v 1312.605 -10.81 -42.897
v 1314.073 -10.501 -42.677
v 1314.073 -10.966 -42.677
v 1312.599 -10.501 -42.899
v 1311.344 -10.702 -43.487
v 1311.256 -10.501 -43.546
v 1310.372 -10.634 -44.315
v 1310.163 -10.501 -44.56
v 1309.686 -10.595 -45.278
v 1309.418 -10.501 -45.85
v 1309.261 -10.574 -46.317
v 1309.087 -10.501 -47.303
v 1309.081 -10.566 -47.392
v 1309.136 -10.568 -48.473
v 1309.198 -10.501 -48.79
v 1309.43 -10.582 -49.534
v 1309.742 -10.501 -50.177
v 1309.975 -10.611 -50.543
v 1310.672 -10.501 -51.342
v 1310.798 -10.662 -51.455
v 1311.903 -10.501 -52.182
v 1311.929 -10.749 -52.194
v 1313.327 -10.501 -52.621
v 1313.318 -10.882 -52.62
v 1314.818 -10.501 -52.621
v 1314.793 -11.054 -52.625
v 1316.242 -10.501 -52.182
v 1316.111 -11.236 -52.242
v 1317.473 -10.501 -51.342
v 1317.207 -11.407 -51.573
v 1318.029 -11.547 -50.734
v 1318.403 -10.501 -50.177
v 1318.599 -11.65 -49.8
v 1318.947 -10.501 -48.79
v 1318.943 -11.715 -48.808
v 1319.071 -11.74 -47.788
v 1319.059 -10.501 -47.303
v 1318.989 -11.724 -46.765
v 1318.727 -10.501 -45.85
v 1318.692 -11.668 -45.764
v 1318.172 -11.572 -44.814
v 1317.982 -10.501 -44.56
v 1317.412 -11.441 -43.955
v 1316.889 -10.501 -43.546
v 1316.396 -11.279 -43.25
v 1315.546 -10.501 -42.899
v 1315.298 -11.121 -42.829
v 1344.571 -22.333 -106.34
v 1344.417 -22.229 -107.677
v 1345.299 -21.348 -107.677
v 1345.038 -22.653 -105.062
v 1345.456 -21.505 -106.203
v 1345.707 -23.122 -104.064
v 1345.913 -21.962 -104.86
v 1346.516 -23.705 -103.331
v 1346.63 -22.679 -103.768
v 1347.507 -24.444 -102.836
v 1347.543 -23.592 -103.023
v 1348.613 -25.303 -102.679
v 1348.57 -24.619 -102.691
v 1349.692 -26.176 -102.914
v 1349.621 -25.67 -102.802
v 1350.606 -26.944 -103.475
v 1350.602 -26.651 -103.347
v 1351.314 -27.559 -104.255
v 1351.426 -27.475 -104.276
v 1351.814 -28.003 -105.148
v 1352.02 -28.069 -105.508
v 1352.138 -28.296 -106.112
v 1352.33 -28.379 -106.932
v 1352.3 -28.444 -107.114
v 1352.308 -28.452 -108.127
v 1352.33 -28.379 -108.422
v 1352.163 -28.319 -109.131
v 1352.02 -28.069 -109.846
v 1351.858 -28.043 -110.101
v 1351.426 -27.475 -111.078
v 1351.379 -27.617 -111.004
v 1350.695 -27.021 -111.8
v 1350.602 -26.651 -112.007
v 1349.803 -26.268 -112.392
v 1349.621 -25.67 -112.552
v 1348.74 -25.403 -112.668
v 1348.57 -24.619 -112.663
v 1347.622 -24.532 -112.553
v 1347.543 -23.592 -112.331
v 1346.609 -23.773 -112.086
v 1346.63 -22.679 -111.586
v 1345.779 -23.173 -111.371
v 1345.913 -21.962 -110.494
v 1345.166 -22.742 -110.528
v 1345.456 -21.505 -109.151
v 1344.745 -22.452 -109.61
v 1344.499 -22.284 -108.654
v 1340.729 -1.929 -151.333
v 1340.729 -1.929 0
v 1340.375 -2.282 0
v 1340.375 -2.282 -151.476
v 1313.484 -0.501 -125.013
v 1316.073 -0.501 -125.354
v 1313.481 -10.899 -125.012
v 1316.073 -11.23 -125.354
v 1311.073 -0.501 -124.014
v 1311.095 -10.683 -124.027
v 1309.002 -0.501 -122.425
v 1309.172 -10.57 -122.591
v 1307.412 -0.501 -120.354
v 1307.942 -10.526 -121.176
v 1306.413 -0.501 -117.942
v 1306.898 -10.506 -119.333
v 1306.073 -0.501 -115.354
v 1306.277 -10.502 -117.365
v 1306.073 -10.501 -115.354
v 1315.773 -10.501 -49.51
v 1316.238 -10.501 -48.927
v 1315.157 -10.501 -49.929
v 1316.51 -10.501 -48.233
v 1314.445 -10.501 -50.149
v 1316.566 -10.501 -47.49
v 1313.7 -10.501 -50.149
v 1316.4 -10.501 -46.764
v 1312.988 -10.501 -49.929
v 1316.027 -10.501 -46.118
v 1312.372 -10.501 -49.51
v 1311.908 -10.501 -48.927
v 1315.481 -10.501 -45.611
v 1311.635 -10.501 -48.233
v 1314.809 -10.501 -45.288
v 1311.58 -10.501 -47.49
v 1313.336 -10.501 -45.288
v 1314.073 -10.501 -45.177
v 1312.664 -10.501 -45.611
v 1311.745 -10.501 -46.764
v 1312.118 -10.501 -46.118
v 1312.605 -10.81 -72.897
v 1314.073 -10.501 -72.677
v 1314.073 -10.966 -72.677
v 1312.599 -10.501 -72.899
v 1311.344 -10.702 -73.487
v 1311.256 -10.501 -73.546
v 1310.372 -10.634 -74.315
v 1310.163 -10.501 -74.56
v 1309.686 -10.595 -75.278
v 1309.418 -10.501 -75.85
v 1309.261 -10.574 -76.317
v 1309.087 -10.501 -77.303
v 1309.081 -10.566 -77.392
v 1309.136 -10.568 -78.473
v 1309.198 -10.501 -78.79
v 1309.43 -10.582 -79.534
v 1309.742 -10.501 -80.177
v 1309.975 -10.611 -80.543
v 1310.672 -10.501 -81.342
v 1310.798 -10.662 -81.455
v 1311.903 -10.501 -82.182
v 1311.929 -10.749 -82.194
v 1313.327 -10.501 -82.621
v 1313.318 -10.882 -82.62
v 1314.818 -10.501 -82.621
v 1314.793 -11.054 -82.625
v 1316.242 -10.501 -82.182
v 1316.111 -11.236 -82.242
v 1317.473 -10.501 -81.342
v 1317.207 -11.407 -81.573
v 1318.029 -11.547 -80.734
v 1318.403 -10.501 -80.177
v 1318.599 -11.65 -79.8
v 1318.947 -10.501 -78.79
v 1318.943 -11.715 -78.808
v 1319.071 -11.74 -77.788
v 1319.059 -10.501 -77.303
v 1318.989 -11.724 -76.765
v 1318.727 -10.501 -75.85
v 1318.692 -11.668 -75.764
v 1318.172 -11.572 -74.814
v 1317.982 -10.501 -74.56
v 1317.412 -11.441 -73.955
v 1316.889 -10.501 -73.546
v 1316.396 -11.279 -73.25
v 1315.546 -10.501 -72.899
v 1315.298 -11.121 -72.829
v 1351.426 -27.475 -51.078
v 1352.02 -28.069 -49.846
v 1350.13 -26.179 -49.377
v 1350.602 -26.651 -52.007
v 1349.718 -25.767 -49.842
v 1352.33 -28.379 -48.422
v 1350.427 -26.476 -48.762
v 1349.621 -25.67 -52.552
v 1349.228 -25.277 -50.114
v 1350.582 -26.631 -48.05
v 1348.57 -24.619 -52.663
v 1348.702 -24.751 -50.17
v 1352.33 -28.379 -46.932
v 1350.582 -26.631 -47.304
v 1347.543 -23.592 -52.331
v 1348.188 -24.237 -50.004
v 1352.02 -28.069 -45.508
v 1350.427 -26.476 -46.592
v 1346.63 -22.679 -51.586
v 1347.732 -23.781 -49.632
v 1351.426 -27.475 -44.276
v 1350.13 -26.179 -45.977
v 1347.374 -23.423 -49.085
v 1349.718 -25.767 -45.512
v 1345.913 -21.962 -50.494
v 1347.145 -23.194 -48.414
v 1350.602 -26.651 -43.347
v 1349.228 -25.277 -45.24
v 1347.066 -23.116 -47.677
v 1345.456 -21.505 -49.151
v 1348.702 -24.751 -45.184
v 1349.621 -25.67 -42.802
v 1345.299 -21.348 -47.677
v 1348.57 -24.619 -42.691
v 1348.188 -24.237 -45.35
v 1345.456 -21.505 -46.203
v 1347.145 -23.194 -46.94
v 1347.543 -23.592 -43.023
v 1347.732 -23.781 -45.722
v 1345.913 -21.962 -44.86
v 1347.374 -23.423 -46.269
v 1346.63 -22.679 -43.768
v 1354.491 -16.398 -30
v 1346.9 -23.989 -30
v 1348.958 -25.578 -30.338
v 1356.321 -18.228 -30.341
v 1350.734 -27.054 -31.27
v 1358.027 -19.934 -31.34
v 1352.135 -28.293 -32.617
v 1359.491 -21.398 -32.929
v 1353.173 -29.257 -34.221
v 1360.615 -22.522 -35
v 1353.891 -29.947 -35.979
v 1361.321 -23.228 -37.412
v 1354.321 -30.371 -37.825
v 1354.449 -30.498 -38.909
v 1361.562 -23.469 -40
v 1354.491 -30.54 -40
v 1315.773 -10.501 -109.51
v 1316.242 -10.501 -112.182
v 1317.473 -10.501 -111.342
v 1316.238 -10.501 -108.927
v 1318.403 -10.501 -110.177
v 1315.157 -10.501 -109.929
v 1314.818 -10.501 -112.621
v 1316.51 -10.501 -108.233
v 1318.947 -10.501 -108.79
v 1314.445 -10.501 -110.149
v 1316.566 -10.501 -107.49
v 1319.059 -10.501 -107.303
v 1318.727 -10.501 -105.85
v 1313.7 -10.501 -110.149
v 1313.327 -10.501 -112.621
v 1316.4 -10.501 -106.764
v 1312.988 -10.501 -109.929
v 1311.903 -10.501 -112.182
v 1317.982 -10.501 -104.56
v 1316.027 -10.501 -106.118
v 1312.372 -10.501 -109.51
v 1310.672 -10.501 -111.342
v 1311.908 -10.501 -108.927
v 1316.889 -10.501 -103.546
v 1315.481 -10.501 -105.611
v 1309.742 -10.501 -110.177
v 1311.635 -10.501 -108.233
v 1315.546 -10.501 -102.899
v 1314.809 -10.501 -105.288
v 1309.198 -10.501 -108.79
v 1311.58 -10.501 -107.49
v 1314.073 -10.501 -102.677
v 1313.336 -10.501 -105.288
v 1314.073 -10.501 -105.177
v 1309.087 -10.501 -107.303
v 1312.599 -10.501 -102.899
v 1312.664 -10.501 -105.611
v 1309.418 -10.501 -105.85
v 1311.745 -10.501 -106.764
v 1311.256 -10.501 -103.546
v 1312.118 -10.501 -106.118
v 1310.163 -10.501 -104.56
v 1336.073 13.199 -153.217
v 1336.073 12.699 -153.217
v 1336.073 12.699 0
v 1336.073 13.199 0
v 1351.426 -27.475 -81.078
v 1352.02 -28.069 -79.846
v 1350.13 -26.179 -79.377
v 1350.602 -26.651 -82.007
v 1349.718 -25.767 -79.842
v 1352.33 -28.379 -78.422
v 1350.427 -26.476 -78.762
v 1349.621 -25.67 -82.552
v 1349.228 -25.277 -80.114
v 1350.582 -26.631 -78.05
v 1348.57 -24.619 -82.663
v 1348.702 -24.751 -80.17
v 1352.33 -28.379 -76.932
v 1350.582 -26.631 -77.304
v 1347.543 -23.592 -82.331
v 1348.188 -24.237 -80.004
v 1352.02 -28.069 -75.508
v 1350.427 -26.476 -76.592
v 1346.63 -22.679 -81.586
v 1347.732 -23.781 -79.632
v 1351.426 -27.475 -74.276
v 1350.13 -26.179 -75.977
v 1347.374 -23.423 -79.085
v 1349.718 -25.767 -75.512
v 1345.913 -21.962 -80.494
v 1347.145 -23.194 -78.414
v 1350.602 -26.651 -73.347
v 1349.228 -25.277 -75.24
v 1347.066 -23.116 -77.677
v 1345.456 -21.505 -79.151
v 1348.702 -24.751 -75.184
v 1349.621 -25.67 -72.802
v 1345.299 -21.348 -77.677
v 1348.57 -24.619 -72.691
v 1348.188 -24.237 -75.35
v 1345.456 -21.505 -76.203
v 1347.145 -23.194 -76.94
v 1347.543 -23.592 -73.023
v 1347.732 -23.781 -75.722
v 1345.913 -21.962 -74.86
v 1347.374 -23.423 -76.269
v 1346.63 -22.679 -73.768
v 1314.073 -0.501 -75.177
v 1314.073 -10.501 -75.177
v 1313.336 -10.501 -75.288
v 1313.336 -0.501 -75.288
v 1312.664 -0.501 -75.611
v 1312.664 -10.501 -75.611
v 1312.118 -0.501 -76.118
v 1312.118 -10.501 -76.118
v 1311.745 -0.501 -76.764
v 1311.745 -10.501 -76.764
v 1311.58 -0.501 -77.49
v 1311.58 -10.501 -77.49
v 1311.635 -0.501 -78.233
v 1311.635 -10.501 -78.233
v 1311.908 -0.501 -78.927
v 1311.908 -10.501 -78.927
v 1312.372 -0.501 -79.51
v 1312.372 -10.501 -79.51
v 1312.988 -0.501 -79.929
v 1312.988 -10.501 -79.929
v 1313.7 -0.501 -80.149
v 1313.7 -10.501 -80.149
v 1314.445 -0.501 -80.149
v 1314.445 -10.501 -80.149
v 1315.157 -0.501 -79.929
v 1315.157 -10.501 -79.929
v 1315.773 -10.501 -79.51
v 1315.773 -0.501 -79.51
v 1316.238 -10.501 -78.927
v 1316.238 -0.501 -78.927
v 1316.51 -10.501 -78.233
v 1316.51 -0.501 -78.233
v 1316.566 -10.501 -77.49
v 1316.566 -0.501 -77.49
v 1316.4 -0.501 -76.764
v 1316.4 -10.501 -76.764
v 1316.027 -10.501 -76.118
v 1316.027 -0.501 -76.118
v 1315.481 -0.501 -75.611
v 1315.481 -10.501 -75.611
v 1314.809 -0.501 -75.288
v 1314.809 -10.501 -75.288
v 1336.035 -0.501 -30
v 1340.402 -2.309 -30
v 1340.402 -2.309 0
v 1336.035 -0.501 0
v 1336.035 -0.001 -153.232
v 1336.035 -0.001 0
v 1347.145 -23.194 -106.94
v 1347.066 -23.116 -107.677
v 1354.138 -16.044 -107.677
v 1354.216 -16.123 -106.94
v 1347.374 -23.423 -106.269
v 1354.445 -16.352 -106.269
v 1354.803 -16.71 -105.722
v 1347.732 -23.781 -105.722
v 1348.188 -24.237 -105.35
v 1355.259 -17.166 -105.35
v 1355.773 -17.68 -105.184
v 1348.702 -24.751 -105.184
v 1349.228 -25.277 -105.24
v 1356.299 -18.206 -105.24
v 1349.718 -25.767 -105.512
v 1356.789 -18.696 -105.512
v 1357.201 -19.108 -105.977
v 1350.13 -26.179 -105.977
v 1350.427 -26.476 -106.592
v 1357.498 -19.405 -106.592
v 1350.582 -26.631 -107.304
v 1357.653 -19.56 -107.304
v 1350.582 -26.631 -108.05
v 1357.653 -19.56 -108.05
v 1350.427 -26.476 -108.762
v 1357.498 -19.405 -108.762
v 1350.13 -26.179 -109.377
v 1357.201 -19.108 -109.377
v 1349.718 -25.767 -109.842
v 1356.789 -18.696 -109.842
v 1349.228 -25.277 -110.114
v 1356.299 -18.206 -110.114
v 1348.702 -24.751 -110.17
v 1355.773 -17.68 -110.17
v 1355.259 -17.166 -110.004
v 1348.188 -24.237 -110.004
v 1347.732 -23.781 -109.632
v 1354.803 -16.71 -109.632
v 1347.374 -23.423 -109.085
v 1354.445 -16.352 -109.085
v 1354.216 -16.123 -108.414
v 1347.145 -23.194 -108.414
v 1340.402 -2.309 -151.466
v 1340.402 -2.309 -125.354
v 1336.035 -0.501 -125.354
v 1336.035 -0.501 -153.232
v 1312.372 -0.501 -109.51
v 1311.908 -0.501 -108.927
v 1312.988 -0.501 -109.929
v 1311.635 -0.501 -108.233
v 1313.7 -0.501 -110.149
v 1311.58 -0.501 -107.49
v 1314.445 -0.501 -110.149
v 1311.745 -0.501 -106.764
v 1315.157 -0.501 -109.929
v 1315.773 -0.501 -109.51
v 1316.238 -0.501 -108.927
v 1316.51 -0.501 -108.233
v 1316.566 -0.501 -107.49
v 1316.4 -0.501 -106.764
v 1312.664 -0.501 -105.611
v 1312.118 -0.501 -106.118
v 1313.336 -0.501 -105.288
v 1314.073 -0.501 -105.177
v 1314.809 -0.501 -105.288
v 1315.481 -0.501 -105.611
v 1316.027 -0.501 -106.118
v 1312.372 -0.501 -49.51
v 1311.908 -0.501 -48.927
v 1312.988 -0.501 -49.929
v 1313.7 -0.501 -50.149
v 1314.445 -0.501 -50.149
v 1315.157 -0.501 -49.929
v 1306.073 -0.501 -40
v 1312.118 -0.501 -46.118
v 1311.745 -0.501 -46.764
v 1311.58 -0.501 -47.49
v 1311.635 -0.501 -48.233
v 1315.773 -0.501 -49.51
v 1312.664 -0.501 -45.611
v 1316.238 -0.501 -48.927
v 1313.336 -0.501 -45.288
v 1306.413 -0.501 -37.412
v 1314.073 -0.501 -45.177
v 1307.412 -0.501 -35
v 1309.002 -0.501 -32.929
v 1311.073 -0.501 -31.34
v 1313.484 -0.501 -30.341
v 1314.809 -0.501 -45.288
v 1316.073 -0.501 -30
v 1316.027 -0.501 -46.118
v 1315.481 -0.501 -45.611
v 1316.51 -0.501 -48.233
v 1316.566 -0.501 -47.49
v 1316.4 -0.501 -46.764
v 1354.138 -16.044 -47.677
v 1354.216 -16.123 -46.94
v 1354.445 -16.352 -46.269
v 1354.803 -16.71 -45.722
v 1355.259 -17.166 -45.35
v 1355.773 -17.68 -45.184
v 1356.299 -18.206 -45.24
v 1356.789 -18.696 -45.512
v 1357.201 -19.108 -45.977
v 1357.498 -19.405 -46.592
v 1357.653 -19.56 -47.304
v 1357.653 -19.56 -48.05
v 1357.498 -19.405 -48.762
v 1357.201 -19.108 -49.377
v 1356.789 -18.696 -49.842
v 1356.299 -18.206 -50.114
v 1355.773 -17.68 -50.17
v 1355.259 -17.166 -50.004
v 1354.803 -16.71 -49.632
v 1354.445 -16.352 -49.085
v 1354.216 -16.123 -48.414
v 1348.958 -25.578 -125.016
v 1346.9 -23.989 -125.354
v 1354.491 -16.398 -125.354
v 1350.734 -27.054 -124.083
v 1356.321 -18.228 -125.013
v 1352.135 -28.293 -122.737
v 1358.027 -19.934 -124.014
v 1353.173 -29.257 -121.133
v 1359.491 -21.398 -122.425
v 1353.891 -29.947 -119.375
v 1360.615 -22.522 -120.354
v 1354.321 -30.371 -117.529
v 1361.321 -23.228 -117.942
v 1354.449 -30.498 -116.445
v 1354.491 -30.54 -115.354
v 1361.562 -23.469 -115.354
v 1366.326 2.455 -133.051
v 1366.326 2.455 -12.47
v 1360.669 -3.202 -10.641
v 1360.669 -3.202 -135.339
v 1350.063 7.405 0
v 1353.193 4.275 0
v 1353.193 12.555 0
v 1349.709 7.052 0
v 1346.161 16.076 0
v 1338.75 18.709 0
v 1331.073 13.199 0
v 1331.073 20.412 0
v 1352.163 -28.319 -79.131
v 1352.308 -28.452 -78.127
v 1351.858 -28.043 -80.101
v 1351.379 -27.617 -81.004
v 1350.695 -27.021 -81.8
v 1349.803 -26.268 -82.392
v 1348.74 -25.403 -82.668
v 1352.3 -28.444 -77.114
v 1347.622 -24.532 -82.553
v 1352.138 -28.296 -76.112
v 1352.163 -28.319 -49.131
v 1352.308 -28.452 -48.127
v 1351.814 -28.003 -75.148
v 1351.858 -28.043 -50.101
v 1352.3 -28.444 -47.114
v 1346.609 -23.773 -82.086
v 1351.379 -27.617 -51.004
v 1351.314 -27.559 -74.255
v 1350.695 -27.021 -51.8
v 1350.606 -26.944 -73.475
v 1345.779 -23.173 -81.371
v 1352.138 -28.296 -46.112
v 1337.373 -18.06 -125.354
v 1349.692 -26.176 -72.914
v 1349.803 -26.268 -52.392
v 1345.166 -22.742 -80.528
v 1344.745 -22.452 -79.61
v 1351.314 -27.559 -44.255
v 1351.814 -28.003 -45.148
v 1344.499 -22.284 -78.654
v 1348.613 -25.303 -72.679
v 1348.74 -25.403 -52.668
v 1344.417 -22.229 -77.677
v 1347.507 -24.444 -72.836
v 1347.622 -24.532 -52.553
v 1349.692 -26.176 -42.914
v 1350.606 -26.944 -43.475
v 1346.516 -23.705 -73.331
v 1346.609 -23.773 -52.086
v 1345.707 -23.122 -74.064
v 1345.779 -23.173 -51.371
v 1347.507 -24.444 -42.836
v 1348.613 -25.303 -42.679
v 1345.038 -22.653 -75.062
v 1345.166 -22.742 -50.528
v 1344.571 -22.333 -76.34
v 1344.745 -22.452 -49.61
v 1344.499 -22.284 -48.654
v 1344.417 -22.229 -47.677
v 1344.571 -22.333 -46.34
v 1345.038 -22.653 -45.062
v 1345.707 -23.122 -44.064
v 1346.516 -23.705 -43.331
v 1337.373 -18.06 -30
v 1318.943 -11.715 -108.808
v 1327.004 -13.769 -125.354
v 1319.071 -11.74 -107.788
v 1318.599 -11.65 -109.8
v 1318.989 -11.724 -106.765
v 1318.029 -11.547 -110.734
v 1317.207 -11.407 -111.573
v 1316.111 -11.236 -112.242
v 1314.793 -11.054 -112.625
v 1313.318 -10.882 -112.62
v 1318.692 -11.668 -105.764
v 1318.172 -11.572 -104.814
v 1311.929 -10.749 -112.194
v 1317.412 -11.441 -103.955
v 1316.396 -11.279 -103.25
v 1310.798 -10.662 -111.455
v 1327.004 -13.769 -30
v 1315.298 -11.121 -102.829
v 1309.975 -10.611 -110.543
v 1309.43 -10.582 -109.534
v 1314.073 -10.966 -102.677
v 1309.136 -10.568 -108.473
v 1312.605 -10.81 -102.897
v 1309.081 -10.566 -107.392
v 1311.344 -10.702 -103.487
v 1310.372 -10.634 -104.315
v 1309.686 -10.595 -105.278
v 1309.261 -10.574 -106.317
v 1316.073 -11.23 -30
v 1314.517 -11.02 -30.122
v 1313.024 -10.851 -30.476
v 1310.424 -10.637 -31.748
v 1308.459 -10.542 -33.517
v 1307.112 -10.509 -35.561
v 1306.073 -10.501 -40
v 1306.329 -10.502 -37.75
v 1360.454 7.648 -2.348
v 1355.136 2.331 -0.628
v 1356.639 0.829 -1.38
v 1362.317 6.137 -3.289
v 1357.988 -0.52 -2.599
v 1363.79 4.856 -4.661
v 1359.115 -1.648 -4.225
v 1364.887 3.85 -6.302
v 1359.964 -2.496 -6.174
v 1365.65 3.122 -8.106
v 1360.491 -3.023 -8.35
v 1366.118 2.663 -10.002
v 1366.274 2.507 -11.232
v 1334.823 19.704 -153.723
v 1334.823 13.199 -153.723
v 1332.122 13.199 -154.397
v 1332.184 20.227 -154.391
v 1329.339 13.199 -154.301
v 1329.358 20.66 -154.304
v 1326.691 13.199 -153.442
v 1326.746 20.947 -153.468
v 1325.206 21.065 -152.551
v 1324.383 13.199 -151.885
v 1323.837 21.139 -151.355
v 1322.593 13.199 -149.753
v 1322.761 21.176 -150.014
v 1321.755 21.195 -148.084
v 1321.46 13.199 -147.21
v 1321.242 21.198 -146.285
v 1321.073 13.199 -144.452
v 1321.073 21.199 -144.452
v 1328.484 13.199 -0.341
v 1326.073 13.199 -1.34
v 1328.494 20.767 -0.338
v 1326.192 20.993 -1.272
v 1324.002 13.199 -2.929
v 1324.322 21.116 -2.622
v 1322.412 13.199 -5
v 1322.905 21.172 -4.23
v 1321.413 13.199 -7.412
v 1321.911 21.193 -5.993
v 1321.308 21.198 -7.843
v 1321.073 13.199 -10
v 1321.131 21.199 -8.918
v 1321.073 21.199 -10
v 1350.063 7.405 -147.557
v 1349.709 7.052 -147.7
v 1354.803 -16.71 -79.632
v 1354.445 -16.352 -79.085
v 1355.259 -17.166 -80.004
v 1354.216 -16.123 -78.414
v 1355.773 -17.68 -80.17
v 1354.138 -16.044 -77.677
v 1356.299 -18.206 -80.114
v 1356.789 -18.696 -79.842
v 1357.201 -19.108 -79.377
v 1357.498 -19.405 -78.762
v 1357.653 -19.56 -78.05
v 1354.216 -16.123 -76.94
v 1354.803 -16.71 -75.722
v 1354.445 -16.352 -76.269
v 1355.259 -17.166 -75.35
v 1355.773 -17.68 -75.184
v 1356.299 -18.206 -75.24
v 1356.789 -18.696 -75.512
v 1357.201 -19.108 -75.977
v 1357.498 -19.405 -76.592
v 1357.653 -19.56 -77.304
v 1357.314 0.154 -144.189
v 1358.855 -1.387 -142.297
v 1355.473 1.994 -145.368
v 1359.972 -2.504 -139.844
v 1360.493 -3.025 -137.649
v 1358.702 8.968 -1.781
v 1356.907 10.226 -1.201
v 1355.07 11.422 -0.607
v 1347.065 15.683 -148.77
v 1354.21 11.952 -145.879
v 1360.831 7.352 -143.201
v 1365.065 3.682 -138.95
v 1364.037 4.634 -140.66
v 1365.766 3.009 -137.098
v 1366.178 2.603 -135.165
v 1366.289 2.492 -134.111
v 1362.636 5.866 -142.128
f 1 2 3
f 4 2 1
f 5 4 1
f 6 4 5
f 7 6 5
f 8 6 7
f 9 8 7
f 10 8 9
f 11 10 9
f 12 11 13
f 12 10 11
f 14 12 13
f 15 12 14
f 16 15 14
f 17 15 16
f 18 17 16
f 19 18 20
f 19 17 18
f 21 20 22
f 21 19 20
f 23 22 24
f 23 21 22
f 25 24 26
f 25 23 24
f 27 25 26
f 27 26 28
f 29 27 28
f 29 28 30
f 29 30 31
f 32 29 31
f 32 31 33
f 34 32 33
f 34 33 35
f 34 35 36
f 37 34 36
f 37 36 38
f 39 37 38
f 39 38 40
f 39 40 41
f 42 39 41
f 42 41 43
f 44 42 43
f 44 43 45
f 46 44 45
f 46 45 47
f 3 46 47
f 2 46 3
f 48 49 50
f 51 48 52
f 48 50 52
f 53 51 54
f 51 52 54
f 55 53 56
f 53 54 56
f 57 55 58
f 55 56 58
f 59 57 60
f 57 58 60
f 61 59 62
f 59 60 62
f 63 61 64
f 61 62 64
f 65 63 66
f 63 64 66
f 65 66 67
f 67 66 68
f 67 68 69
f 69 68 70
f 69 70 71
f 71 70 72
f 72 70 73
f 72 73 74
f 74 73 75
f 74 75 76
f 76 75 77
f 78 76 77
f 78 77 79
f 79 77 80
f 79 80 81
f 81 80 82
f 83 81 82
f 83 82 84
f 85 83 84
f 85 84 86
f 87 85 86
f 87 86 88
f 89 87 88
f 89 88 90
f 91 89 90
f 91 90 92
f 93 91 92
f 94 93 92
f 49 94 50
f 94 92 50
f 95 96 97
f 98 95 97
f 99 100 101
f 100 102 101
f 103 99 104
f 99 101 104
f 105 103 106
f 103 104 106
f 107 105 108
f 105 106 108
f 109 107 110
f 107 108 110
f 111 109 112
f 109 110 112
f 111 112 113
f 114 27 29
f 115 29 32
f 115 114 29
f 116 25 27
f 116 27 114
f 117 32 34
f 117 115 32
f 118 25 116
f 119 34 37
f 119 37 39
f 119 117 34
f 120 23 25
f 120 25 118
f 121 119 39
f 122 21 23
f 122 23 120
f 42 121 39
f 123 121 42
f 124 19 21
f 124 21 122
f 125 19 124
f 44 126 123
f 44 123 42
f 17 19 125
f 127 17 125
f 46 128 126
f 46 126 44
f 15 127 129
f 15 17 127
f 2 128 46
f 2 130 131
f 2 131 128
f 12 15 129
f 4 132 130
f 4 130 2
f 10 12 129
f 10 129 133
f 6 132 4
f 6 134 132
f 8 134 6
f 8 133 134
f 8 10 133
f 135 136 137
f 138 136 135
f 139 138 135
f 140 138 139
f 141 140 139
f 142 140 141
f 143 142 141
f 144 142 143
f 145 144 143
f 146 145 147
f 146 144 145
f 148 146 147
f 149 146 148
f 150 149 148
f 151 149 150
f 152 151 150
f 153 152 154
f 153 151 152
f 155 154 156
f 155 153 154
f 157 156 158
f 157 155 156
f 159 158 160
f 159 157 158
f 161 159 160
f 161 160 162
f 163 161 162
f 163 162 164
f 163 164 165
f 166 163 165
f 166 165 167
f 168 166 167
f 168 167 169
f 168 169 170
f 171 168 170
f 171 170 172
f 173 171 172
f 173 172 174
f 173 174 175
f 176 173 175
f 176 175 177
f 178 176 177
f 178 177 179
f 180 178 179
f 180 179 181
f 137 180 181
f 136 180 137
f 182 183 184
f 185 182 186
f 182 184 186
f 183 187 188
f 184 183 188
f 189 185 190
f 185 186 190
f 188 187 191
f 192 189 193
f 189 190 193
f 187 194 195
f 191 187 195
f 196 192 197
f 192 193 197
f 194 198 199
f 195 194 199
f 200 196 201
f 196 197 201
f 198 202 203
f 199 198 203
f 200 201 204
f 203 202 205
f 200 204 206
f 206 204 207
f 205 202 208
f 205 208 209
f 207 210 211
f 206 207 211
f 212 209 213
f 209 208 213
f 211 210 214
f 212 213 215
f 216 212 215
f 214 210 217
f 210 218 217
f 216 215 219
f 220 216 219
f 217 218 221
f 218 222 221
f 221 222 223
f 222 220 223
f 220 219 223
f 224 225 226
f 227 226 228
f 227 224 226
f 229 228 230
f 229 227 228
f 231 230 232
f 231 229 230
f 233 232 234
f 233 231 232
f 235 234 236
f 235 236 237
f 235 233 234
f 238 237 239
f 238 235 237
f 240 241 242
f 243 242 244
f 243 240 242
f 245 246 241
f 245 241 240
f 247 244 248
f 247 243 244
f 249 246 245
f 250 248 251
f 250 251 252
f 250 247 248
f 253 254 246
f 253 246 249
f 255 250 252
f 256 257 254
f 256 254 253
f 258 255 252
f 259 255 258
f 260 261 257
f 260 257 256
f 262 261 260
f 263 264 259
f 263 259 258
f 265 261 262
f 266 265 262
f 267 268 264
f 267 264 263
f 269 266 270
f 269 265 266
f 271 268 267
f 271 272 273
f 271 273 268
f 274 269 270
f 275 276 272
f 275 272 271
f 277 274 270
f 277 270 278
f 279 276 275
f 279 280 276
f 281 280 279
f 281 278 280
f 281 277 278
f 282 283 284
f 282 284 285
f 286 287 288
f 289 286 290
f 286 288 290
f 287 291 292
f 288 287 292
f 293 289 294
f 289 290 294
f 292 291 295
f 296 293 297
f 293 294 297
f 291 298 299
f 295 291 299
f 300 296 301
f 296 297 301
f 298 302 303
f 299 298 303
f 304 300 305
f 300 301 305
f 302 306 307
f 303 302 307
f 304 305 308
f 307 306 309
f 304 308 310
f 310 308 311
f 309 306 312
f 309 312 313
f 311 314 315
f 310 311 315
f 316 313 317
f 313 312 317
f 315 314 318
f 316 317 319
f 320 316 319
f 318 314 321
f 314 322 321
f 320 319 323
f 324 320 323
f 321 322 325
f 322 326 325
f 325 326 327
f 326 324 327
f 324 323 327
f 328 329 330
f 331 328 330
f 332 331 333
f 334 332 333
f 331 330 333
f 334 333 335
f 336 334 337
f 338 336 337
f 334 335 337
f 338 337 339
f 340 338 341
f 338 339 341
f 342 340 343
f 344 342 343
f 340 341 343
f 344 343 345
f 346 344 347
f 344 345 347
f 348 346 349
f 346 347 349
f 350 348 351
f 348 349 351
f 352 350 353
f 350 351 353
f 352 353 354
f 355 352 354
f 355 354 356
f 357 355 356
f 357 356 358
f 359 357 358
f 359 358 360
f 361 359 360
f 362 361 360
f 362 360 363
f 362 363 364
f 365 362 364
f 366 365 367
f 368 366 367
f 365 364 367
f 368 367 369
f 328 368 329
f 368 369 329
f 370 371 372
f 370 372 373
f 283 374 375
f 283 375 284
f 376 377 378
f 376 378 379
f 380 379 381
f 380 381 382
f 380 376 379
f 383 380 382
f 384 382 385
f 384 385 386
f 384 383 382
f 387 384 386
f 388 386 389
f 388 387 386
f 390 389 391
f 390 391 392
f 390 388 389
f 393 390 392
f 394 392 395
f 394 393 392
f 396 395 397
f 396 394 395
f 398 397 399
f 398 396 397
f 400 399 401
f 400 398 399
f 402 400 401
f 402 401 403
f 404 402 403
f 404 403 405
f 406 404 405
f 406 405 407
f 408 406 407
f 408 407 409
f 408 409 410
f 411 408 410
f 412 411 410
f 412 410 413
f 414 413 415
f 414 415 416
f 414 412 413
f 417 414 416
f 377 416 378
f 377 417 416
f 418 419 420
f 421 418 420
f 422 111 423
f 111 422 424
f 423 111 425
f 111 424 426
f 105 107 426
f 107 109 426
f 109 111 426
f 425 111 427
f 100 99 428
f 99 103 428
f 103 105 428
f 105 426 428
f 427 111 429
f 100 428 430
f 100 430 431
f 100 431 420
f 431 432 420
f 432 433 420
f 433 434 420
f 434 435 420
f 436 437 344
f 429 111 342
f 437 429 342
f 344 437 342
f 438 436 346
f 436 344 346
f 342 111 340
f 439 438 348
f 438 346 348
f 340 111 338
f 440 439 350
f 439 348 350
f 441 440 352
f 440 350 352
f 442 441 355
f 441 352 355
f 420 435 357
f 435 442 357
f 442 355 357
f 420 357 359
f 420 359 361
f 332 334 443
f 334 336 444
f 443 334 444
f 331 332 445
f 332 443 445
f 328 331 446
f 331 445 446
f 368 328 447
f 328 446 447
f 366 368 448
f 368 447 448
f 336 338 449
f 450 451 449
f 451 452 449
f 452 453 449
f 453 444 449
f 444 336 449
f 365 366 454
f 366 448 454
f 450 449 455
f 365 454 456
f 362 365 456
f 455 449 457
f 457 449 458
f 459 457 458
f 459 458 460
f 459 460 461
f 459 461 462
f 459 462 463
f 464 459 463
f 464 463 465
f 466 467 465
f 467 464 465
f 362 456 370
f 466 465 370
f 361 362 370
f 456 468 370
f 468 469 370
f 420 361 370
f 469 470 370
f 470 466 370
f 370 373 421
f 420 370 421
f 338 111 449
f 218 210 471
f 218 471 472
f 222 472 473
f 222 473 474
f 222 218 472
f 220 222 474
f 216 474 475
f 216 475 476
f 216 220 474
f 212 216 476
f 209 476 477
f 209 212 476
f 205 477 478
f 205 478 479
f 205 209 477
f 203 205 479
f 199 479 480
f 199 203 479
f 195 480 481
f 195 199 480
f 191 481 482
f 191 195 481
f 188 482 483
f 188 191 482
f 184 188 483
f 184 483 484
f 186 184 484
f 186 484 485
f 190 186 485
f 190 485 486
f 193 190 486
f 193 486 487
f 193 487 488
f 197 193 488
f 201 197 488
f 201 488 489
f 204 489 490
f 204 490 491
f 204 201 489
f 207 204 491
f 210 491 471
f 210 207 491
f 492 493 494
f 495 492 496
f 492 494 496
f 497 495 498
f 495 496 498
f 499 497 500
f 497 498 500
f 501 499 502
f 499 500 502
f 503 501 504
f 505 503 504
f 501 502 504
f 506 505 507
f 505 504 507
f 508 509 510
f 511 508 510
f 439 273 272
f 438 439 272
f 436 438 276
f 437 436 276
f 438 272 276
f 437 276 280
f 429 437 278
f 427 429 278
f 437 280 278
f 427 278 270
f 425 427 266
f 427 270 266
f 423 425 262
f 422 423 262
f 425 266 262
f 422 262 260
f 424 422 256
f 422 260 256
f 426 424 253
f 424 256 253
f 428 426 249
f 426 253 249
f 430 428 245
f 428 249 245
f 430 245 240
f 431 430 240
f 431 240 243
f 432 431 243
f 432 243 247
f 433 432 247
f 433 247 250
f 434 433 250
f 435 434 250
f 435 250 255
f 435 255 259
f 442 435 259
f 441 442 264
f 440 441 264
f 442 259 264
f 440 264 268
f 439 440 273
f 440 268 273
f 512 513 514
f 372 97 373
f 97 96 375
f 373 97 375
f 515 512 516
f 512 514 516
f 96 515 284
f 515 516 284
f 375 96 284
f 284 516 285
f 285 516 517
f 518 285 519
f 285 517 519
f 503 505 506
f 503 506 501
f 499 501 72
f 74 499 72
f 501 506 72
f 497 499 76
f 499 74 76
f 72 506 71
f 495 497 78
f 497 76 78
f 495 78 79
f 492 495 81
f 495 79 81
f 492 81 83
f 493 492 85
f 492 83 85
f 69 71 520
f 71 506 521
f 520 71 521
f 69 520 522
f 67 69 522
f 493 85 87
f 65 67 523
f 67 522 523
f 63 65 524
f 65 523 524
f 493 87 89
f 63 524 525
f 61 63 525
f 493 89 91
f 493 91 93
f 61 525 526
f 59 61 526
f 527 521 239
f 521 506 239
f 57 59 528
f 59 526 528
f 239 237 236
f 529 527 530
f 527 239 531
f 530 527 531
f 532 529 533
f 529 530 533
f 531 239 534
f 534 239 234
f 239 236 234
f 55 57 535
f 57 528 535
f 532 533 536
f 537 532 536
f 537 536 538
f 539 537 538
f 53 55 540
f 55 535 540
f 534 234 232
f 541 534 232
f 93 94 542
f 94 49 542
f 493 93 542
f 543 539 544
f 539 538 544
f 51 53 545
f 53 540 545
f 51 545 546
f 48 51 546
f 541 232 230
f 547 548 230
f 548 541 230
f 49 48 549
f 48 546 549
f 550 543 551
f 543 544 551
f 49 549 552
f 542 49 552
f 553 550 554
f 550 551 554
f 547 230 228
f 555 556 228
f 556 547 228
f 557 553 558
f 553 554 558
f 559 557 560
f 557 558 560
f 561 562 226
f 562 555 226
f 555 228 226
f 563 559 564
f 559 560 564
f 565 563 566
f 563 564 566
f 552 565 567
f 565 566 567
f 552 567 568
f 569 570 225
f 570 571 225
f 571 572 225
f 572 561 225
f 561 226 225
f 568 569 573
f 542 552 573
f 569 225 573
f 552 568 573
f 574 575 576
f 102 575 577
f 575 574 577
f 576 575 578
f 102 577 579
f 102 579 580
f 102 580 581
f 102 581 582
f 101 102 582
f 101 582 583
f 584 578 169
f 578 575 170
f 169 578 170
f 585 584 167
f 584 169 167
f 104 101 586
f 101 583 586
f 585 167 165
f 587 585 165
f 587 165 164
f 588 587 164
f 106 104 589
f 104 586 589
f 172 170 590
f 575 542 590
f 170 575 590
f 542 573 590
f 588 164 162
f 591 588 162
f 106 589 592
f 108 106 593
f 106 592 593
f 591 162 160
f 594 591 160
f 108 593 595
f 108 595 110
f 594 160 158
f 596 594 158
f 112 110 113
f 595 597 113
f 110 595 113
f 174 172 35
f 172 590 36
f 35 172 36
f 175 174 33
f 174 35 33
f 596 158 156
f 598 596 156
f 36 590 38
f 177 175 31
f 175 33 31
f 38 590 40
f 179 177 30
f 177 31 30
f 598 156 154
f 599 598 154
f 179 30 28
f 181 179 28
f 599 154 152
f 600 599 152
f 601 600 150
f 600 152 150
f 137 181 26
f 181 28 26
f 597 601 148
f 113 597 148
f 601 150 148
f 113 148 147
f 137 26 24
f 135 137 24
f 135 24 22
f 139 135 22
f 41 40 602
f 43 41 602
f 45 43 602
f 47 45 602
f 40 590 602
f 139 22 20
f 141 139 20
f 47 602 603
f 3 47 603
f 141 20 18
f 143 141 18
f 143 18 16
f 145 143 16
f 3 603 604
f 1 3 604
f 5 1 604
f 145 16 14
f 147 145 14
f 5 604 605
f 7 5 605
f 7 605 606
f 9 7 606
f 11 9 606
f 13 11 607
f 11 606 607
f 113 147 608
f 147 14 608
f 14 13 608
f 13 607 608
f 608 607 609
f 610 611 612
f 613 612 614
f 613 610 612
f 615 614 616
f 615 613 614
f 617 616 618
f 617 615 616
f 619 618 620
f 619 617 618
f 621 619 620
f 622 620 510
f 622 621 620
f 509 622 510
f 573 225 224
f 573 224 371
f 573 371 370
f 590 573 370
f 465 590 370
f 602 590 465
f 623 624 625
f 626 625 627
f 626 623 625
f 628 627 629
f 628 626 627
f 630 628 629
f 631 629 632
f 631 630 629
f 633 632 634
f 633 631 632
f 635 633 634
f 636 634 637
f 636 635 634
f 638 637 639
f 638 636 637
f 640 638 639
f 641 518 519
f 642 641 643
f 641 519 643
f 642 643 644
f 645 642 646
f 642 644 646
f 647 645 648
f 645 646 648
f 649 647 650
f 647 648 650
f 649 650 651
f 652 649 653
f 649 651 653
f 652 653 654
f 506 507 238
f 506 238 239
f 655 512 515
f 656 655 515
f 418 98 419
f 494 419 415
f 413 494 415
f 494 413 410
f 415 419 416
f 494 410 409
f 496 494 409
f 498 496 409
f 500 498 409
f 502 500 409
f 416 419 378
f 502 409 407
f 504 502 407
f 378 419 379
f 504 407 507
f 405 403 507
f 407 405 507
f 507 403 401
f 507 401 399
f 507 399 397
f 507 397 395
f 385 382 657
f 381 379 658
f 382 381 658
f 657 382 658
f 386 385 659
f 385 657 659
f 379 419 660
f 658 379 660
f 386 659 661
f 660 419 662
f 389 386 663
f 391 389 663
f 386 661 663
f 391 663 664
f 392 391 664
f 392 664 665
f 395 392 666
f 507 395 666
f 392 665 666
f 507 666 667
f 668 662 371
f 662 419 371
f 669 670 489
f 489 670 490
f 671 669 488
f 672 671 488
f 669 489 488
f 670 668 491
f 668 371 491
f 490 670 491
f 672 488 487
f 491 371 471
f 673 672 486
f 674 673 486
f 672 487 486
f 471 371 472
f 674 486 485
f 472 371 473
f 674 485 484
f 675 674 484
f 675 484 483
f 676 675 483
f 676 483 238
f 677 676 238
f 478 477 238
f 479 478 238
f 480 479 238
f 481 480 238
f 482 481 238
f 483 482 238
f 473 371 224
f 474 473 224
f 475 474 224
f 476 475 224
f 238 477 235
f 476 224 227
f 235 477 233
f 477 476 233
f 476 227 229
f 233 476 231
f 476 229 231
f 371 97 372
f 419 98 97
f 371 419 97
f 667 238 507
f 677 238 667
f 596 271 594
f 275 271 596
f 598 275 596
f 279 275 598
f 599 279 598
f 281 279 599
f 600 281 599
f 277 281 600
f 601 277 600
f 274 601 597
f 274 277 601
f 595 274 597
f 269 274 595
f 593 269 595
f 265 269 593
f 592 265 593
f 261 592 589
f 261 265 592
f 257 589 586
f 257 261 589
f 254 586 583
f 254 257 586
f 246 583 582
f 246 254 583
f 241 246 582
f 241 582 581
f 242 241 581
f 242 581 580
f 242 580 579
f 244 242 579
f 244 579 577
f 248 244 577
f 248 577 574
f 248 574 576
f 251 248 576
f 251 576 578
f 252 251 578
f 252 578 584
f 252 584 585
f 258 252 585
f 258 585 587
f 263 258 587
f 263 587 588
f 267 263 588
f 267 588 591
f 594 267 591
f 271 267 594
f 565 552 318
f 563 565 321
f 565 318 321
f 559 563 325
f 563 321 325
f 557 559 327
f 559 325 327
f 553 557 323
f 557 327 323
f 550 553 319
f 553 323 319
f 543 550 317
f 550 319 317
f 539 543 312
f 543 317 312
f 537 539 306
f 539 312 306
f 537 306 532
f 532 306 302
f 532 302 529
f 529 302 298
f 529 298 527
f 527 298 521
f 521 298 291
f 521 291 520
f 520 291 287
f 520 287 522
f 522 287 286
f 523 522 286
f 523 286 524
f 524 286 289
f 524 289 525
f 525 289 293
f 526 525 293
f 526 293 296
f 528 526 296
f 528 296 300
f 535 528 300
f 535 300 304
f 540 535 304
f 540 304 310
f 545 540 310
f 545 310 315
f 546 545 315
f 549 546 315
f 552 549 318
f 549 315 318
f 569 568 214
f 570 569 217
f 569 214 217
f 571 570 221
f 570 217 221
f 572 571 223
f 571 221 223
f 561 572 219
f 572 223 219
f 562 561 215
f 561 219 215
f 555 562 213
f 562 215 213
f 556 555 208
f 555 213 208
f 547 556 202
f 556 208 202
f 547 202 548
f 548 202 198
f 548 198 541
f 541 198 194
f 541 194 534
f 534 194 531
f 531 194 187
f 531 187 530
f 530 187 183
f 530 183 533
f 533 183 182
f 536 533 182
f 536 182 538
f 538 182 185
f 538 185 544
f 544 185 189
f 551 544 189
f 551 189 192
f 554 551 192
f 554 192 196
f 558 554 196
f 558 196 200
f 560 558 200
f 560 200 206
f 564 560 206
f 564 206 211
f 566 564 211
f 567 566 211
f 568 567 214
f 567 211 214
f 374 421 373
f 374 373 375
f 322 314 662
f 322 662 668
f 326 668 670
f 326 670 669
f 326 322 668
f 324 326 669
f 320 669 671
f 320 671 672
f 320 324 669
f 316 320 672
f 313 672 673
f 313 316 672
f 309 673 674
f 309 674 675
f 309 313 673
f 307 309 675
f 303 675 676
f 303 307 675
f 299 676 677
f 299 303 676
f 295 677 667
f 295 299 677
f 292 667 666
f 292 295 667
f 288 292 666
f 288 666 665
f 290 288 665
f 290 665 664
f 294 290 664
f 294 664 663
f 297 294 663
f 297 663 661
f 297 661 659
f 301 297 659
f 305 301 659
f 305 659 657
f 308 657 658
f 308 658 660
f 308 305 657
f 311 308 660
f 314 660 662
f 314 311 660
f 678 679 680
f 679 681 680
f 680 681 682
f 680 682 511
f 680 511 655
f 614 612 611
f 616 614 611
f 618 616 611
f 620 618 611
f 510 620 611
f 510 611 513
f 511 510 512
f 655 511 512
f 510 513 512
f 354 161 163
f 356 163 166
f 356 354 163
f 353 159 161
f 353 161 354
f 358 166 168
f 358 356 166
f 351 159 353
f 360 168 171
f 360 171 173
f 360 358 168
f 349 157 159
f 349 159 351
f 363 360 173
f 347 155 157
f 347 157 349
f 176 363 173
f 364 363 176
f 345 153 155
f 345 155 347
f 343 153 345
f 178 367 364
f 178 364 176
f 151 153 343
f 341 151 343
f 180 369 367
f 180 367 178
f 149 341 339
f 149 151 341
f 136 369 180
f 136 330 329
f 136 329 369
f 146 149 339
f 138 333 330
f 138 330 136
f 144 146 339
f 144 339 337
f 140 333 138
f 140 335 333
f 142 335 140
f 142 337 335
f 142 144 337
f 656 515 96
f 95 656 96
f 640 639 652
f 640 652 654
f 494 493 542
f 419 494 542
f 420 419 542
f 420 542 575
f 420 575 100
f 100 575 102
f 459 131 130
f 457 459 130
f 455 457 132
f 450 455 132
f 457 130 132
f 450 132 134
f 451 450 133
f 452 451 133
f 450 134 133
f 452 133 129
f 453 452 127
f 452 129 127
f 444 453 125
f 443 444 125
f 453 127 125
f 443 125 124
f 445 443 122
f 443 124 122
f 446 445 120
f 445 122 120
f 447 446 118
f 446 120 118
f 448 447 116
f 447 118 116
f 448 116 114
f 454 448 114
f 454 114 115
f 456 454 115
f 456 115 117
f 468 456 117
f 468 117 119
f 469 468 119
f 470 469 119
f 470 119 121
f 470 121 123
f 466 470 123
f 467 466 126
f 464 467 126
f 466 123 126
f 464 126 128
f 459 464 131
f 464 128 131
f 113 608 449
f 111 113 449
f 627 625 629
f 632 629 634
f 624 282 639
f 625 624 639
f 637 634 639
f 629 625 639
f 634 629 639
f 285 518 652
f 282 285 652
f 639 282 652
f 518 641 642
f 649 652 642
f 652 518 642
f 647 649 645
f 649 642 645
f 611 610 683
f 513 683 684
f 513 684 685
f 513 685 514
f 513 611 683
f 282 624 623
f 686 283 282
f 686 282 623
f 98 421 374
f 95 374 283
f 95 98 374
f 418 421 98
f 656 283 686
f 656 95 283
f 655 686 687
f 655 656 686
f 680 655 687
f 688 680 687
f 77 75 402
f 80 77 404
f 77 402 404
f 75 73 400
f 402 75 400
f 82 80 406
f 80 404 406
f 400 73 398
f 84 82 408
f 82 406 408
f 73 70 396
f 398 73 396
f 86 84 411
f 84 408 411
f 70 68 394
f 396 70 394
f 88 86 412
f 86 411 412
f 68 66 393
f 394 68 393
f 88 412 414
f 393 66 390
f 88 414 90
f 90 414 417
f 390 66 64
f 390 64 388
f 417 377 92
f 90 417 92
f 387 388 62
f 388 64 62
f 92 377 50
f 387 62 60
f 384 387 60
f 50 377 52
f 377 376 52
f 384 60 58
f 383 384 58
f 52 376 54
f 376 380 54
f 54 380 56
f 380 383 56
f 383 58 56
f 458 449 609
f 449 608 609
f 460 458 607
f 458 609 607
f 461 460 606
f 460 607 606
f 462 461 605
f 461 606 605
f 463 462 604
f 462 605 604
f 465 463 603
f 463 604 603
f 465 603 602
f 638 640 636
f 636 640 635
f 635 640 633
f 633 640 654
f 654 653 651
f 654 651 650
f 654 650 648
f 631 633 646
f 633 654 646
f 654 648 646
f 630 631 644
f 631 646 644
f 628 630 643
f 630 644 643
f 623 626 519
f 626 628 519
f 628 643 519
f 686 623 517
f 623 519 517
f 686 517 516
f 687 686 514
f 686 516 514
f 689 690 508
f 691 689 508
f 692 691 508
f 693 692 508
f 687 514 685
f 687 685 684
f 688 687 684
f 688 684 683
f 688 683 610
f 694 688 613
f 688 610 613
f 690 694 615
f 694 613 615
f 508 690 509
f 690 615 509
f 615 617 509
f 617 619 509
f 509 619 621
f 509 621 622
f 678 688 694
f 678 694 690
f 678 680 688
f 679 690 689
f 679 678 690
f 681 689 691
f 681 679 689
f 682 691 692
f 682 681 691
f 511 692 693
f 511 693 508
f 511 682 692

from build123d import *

# Parameters (mm, degrees)
BOSS_EXTRUDE1_DEPTH                 = 170
CUT_EXTRUDE2_DEPTH                  = 1378.200029658
CUT_EXTRUDE2_DEPTH_BACK             = 1378.200029658
SKETCH7_W                           = 60.055026026
SKETCH7_H                           = 40
SKETCH7_H_2                         = 30
CUT_EXTRUDE7_DEPTH                  = 20.697901
FILLET1_R                           = 10
CUT_EXTRUDE3_REACH                  = 1001.772
CUT_EXTRUDE3_END_RADIUS             = 68.41639524
SKETCH3_R                           = 2.5
CUT_EXTRUDE3_DIRECTION_2_DEPTH      = 10
SKETCH4_R                           = 2.5
CUT_EXTRUDE4_DEPTH                  = 10
CUT_EXTRUDE4_DIRECTION_2_REACH      = 1377.394
CUT_EXTRUDE4_DIRECTION_2_END_RADIUS = 68.41639524
CUT_EXTRUDE5_REACH                  = 1377.394
SKETCH5_R                           = 5
CUT_EXTRUDE6_REACH                  = 1001.772
SKETCH6_R                           = 5


with BuildPart() as part:
    # Sketch1 → Boss-Extrude1 (new body)
    with BuildSketch(Plane.XY):
        with BuildLine():
            Line((1349.709167159, 7.051545827), (1340.728911037, -1.928710294))
            Line((1340.728911037, -1.928710294), (1340.375357647, -2.282263684))
            Line((1340.375357647, -2.282263684), (1361.562180969, -23.469087006))
            Line((1361.562180969, -23.469087006), (1354.491113157, -30.540154818))
            ThreePointArc((1354.491113157, -30.540154818), (1332.276376869, -15.701535719), (1306.072590331, -10.501468778))
            Line((1306.072590331, -10.501468778), (1306.072590331, -0.501468778))
            Line((1306.072590331, -0.501468778), (1336.035283217, -0.501468778))
            Line((1336.035283217, -0.501468778), (1336.035283217, -0.001468778))
            Line((1336.035283217, -0.001468778), (1336.072590331, 12.698531222))
            Line((1336.072590331, 12.698531222), (1336.072590331, 13.198531222))
            Line((1336.072590331, 13.198531222), (1321.072590331, 13.198531222))
            Line((1321.072590331, 13.198531222), (1321.072590331, 21.198531222))
            ThreePointArc((1321.072590331, 21.198531222), (1345.563373492, 16.327364444), (1366.326176516, 2.45535175))
            Line((1366.326176516, 2.45535175), (1360.669322267, -3.2015025))
            Line((1360.669322267, -3.2015025), (1350.062720549, 7.405099218))
            Line((1350.062720549, 7.405099218), (1349.709167159, 7.051545827))
        make_face()
    extrude(amount=-BOSS_EXTRUDE1_DEPTH)

    # Sketch2 → Cut-Extrude2 (cut, two sides: drawn at the far end of the back side and taken through both)
    with BuildSketch(Plane(origin=(0, 0, 0), x_dir=(1, 0, 0), z_dir=(0, 1, 0)).offset(-CUT_EXTRUDE2_DEPTH_BACK)):
        Polygon((1306.072590331, 165.353911181), (1366.326176516, 140.977580956), (1366.326176516, 170), (1306.072590331, 170), align=None)
        Polygon((1366.326176516, 4.246407684), (1353.192629401, 0), (1366.326176516, 0), align=None)
    extrude(amount=CUT_EXTRUDE2_DEPTH + CUT_EXTRUDE2_DEPTH_BACK, mode=Mode.SUBTRACT)

    # Sketch7 → Cut-Extrude7 (cut)
    with BuildSketch(Plane(origin=(187.283823237, 452.52498352, 0), x_dir=(-0.923993669874315, 0.38240776408461624, 0), z_dir=(-0.3824077640846163, -0.9239936698743151, 0))):
        with Locations((-1237.02208443, 145.353911181)):
            Rectangle(SKETCH7_W, SKETCH7_H)
        with Locations((-1237.02208443, 15)):
            Rectangle(SKETCH7_W, SKETCH7_H_2)
    extrude(amount=-CUT_EXTRUDE7_DEPTH, mode=Mode.SUBTRACT)

    # Fillet1
    fillet1_edges = [part.edges().sort_by_distance(p)[0] for p in [
        (1363.497749392, -0.373075375, -3.331905717),
        (1321.072590331, 17.198531222, 0),
        (1363.497749392, -0.373075375, -142.121855977),
        (1321.072590331, 17.198531222, -159.285476478),
        (1306.072590331, -5.501468778, -30),
        (1306.072590331, -5.501468778, -125.353911181),
        (1358.026647063, -27.004620912, -125.353911181),
        (1358.026647063, -27.004620912, -30),
    ]]
    fillet(fillet1_edges, radius=FILLET1_R)

    # Cut-Extrude3: up to this cylinder (the profile starts outside it)
    cut_extrude3_end = Plane(origin=(1306.113416139, -78.917851837, -77.676956), z_dir=(0, 0, 1)) * Cylinder(CUT_EXTRUDE3_END_RADIUS, 2201.37679048, mode=Mode.PRIVATE)
    # Sketch3 → Cut-Extrude3 (cut, up to the surface)
    with BuildSketch(Plane(origin=(661.975479169, 661.975479169, 0), x_dir=(0, 0, 1), z_dir=(0.7071067811866074, 0.7071067811864877, 0)), mode=Mode.PRIVATE) as cut_extrude3_sk1:
        with Locations(Location((-77.676955591, 971.365001741, 0), (0, 0, 270))):
            Circle(SKETCH3_R)
    cut_extrude3_tool1 = extrude(cut_extrude3_sk1.sketch, amount=-CUT_EXTRUDE3_REACH, mode=Mode.PRIVATE) - cut_extrude3_end
    add(cut_extrude3_tool1.solids().sort_by_distance((1348.834259, -24.883301, -77.676956))[0], mode=Mode.SUBTRACT)
    # Sketch3 → Cut-Extrude3 (cut, up to the surface)
    with BuildSketch(Plane(origin=(661.975479169, 661.975479169, 0), x_dir=(0, 0, 1), z_dir=(0.7071067811866074, 0.7071067811864877, 0)), mode=Mode.PRIVATE) as cut_extrude3_sk2:
        with Locations(Location((-107.676955591, 971.365001741, 0), (0, 0, 270))):
            Circle(SKETCH3_R)
    cut_extrude3_tool2 = extrude(cut_extrude3_sk2.sketch, amount=-CUT_EXTRUDE3_REACH, mode=Mode.PRIVATE) - cut_extrude3_end
    add(cut_extrude3_tool2.solids().sort_by_distance((1348.834259, -24.883301, -107.676956))[0], mode=Mode.SUBTRACT)
    # Sketch3 → Cut-Extrude3 (cut, up to the surface)
    with BuildSketch(Plane(origin=(661.975479169, 661.975479169, 0), x_dir=(0, 0, 1), z_dir=(0.7071067811866074, 0.7071067811864877, 0)), mode=Mode.PRIVATE) as cut_extrude3_sk3:
        with Locations(Location((-47.676955591, 971.365001741, 0), (0, 0, 270))):
            Circle(SKETCH3_R)
    cut_extrude3_tool3 = extrude(cut_extrude3_sk3.sketch, amount=-CUT_EXTRUDE3_REACH, mode=Mode.PRIVATE) - cut_extrude3_end
    add(cut_extrude3_tool3.solids().sort_by_distance((1348.834259, -24.883301, -47.676956))[0], mode=Mode.SUBTRACT)

    # Sketch3 → Cut-Extrude3 direction 2 (cut)
    with BuildSketch(Plane(origin=(661.975479169, 661.975479169, 0), x_dir=(0, 0, 1), z_dir=(0.7071067811866074, 0.7071067811864877, 0))):
        with Locations(Location((-77.676955591, 971.365001741, 0), (0, 0, 270))):
            Circle(SKETCH3_R)
        with Locations(Location((-107.676955591, 971.365001741, 0), (0, 0, 270))):
            Circle(SKETCH3_R)
        with Locations(Location((-47.676955591, 971.365001741, 0), (0, 0, 270))):
            Circle(SKETCH3_R)
    extrude(amount=CUT_EXTRUDE3_DIRECTION_2_DEPTH, mode=Mode.SUBTRACT)

    # Sketch4 → Cut-Extrude4 (cut)
    with BuildSketch(Plane(origin=(0, -10.501468778, 0), x_dir=(0, 0, 1), z_dir=(0, -1, 0))):
        with Locations((-107.676955591, -1314.072590331)):
            Circle(SKETCH4_R)
        with Locations((-77.676955591, -1314.072590331)):
            Circle(SKETCH4_R)
        with Locations((-47.676955591, -1314.072590331)):
            Circle(SKETCH4_R)
    extrude(amount=-CUT_EXTRUDE4_DEPTH, mode=Mode.SUBTRACT)

    # Cut-Extrude4 direction 2: up to this cylinder (the profile starts outside it)
    cut_extrude4_direction_2_end = Plane(origin=(1306.113416139, -78.917851837, -77.676956), z_dir=(0, 0, 1)) * Cylinder(CUT_EXTRUDE4_DIRECTION_2_END_RADIUS, 2952.62079048, mode=Mode.PRIVATE)
    # Sketch4 → Cut-Extrude4 direction 2 (cut, up to the surface)
    with BuildSketch(Plane(origin=(0, -10.501468778, 0), x_dir=(0, 0, 1), z_dir=(0, -1, 0)), mode=Mode.PRIVATE) as cut_extrude4_direction_2_sk1:
        with Locations((-107.676955591, -1314.072590331)):
            Circle(SKETCH4_R)
    cut_extrude4_direction_2_tool1 = extrude(cut_extrude4_direction_2_sk1.sketch, amount=CUT_EXTRUDE4_DIRECTION_2_REACH, mode=Mode.PRIVATE) - cut_extrude4_direction_2_end
    add(cut_extrude4_direction_2_tool1.solids().sort_by_distance((1314.07259, -10.501469, -107.676956))[0], mode=Mode.SUBTRACT)
    # Sketch4 → Cut-Extrude4 direction 2 (cut, up to the surface)
    with BuildSketch(Plane(origin=(0, -10.501468778, 0), x_dir=(0, 0, 1), z_dir=(0, -1, 0)), mode=Mode.PRIVATE) as cut_extrude4_direction_2_sk2:
        with Locations((-77.676955591, -1314.072590331)):
            Circle(SKETCH4_R)
    cut_extrude4_direction_2_tool2 = extrude(cut_extrude4_direction_2_sk2.sketch, amount=CUT_EXTRUDE4_DIRECTION_2_REACH, mode=Mode.PRIVATE) - cut_extrude4_direction_2_end
    add(cut_extrude4_direction_2_tool2.solids().sort_by_distance((1314.07259, -10.501469, -77.676956))[0], mode=Mode.SUBTRACT)
    # Sketch4 → Cut-Extrude4 direction 2 (cut, up to the surface)
    with BuildSketch(Plane(origin=(0, -10.501468778, 0), x_dir=(0, 0, 1), z_dir=(0, -1, 0)), mode=Mode.PRIVATE) as cut_extrude4_direction_2_sk3:
        with Locations((-47.676955591, -1314.072590331)):
            Circle(SKETCH4_R)
    cut_extrude4_direction_2_tool3 = extrude(cut_extrude4_direction_2_sk3.sketch, amount=CUT_EXTRUDE4_DIRECTION_2_REACH, mode=Mode.PRIVATE) - cut_extrude4_direction_2_end
    add(cut_extrude4_direction_2_tool3.solids().sort_by_distance((1314.07259, -10.501469, -47.676956))[0], mode=Mode.SUBTRACT)

    # Sketch5 → Cut-Extrude5 (cut, up to next)
    with BuildSketch(Plane(origin=(0, -10.501468778, 0), x_dir=(0, 0, 1), z_dir=(0, -1, 0)), mode=Mode.PRIVATE) as cut_extrude5_sk1:
        with Locations((-47.676955591, -1314.072590331)):
            Circle(SKETCH5_R)
    cut_extrude5_tool1 = extrude(cut_extrude5_sk1.sketch, amount=CUT_EXTRUDE5_REACH, mode=Mode.PRIVATE) & part.part
    # Sketch5 → Cut-Extrude5 (cut, up to next)
    with BuildSketch(Plane(origin=(0, -10.501468778, 0), x_dir=(0, 0, 1), z_dir=(0, -1, 0)), mode=Mode.PRIVATE) as cut_extrude5_sk2:
        with Locations((-77.676955591, -1314.072590331)):
            Circle(SKETCH5_R)
    cut_extrude5_tool2 = extrude(cut_extrude5_sk2.sketch, amount=CUT_EXTRUDE5_REACH, mode=Mode.PRIVATE) & part.part
    # Sketch5 → Cut-Extrude5 (cut, up to next)
    with BuildSketch(Plane(origin=(0, -10.501468778, 0), x_dir=(0, 0, 1), z_dir=(0, -1, 0)), mode=Mode.PRIVATE) as cut_extrude5_sk3:
        with Locations((-107.676955591, -1314.072590331)):
            Circle(SKETCH5_R)
    cut_extrude5_tool3 = extrude(cut_extrude5_sk3.sketch, amount=CUT_EXTRUDE5_REACH, mode=Mode.PRIVATE) & part.part
    add(cut_extrude5_tool1.solids().sort_by_distance((1314.07259, -10.501469, -47.676956))[0], mode=Mode.SUBTRACT)
    add(cut_extrude5_tool2.solids().sort_by_distance((1314.07259, -10.501469, -77.676956))[0], mode=Mode.SUBTRACT)
    add(cut_extrude5_tool3.solids().sort_by_distance((1314.07259, -10.501469, -107.676956))[0], mode=Mode.SUBTRACT)

    # Sketch6 → Cut-Extrude6 (cut, up to next)
    with BuildSketch(Plane(origin=(661.975479169, 661.975479169, 0), x_dir=(0, 0, 1), z_dir=(0.7071067811866074, 0.7071067811864877, 0)), mode=Mode.PRIVATE) as cut_extrude6_sk1:
        with Locations(Location((-107.676955591, 971.365001741, 0), (0, 0, 270))):
            Circle(SKETCH6_R)
    cut_extrude6_tool1 = extrude(cut_extrude6_sk1.sketch, amount=-CUT_EXTRUDE6_REACH, mode=Mode.PRIVATE) & part.part
    # Sketch6 → Cut-Extrude6 (cut, up to next)
    with BuildSketch(Plane(origin=(661.975479169, 661.975479169, 0), x_dir=(0, 0, 1), z_dir=(0.7071067811866074, 0.7071067811864877, 0)), mode=Mode.PRIVATE) as cut_extrude6_sk2:
        with Locations(Location((-77.676955591, 971.365001741, 0), (0, 0, 270))):
            Circle(SKETCH6_R)
    cut_extrude6_tool2 = extrude(cut_extrude6_sk2.sketch, amount=-CUT_EXTRUDE6_REACH, mode=Mode.PRIVATE) & part.part
    # Sketch6 → Cut-Extrude6 (cut, up to next)
    with BuildSketch(Plane(origin=(661.975479169, 661.975479169, 0), x_dir=(0, 0, 1), z_dir=(0.7071067811866074, 0.7071067811864877, 0)), mode=Mode.PRIVATE) as cut_extrude6_sk3:
        with Locations(Location((-47.676955591, 971.365001741, 0), (0, 0, 270))):
            Circle(SKETCH6_R)
    cut_extrude6_tool3 = extrude(cut_extrude6_sk3.sketch, amount=-CUT_EXTRUDE6_REACH, mode=Mode.PRIVATE) & part.part
    add(cut_extrude6_tool1.solids().sort_by_distance((1348.834259, -24.883301, -107.676956))[0], mode=Mode.SUBTRACT)
    add(cut_extrude6_tool2.solids().sort_by_distance((1348.834259, -24.883301, -77.676956))[0], mode=Mode.SUBTRACT)
    add(cut_extrude6_tool3.solids().sort_by_distance((1348.834259, -24.883301, -47.676956))[0], mode=Mode.SUBTRACT)


solid = part.part
